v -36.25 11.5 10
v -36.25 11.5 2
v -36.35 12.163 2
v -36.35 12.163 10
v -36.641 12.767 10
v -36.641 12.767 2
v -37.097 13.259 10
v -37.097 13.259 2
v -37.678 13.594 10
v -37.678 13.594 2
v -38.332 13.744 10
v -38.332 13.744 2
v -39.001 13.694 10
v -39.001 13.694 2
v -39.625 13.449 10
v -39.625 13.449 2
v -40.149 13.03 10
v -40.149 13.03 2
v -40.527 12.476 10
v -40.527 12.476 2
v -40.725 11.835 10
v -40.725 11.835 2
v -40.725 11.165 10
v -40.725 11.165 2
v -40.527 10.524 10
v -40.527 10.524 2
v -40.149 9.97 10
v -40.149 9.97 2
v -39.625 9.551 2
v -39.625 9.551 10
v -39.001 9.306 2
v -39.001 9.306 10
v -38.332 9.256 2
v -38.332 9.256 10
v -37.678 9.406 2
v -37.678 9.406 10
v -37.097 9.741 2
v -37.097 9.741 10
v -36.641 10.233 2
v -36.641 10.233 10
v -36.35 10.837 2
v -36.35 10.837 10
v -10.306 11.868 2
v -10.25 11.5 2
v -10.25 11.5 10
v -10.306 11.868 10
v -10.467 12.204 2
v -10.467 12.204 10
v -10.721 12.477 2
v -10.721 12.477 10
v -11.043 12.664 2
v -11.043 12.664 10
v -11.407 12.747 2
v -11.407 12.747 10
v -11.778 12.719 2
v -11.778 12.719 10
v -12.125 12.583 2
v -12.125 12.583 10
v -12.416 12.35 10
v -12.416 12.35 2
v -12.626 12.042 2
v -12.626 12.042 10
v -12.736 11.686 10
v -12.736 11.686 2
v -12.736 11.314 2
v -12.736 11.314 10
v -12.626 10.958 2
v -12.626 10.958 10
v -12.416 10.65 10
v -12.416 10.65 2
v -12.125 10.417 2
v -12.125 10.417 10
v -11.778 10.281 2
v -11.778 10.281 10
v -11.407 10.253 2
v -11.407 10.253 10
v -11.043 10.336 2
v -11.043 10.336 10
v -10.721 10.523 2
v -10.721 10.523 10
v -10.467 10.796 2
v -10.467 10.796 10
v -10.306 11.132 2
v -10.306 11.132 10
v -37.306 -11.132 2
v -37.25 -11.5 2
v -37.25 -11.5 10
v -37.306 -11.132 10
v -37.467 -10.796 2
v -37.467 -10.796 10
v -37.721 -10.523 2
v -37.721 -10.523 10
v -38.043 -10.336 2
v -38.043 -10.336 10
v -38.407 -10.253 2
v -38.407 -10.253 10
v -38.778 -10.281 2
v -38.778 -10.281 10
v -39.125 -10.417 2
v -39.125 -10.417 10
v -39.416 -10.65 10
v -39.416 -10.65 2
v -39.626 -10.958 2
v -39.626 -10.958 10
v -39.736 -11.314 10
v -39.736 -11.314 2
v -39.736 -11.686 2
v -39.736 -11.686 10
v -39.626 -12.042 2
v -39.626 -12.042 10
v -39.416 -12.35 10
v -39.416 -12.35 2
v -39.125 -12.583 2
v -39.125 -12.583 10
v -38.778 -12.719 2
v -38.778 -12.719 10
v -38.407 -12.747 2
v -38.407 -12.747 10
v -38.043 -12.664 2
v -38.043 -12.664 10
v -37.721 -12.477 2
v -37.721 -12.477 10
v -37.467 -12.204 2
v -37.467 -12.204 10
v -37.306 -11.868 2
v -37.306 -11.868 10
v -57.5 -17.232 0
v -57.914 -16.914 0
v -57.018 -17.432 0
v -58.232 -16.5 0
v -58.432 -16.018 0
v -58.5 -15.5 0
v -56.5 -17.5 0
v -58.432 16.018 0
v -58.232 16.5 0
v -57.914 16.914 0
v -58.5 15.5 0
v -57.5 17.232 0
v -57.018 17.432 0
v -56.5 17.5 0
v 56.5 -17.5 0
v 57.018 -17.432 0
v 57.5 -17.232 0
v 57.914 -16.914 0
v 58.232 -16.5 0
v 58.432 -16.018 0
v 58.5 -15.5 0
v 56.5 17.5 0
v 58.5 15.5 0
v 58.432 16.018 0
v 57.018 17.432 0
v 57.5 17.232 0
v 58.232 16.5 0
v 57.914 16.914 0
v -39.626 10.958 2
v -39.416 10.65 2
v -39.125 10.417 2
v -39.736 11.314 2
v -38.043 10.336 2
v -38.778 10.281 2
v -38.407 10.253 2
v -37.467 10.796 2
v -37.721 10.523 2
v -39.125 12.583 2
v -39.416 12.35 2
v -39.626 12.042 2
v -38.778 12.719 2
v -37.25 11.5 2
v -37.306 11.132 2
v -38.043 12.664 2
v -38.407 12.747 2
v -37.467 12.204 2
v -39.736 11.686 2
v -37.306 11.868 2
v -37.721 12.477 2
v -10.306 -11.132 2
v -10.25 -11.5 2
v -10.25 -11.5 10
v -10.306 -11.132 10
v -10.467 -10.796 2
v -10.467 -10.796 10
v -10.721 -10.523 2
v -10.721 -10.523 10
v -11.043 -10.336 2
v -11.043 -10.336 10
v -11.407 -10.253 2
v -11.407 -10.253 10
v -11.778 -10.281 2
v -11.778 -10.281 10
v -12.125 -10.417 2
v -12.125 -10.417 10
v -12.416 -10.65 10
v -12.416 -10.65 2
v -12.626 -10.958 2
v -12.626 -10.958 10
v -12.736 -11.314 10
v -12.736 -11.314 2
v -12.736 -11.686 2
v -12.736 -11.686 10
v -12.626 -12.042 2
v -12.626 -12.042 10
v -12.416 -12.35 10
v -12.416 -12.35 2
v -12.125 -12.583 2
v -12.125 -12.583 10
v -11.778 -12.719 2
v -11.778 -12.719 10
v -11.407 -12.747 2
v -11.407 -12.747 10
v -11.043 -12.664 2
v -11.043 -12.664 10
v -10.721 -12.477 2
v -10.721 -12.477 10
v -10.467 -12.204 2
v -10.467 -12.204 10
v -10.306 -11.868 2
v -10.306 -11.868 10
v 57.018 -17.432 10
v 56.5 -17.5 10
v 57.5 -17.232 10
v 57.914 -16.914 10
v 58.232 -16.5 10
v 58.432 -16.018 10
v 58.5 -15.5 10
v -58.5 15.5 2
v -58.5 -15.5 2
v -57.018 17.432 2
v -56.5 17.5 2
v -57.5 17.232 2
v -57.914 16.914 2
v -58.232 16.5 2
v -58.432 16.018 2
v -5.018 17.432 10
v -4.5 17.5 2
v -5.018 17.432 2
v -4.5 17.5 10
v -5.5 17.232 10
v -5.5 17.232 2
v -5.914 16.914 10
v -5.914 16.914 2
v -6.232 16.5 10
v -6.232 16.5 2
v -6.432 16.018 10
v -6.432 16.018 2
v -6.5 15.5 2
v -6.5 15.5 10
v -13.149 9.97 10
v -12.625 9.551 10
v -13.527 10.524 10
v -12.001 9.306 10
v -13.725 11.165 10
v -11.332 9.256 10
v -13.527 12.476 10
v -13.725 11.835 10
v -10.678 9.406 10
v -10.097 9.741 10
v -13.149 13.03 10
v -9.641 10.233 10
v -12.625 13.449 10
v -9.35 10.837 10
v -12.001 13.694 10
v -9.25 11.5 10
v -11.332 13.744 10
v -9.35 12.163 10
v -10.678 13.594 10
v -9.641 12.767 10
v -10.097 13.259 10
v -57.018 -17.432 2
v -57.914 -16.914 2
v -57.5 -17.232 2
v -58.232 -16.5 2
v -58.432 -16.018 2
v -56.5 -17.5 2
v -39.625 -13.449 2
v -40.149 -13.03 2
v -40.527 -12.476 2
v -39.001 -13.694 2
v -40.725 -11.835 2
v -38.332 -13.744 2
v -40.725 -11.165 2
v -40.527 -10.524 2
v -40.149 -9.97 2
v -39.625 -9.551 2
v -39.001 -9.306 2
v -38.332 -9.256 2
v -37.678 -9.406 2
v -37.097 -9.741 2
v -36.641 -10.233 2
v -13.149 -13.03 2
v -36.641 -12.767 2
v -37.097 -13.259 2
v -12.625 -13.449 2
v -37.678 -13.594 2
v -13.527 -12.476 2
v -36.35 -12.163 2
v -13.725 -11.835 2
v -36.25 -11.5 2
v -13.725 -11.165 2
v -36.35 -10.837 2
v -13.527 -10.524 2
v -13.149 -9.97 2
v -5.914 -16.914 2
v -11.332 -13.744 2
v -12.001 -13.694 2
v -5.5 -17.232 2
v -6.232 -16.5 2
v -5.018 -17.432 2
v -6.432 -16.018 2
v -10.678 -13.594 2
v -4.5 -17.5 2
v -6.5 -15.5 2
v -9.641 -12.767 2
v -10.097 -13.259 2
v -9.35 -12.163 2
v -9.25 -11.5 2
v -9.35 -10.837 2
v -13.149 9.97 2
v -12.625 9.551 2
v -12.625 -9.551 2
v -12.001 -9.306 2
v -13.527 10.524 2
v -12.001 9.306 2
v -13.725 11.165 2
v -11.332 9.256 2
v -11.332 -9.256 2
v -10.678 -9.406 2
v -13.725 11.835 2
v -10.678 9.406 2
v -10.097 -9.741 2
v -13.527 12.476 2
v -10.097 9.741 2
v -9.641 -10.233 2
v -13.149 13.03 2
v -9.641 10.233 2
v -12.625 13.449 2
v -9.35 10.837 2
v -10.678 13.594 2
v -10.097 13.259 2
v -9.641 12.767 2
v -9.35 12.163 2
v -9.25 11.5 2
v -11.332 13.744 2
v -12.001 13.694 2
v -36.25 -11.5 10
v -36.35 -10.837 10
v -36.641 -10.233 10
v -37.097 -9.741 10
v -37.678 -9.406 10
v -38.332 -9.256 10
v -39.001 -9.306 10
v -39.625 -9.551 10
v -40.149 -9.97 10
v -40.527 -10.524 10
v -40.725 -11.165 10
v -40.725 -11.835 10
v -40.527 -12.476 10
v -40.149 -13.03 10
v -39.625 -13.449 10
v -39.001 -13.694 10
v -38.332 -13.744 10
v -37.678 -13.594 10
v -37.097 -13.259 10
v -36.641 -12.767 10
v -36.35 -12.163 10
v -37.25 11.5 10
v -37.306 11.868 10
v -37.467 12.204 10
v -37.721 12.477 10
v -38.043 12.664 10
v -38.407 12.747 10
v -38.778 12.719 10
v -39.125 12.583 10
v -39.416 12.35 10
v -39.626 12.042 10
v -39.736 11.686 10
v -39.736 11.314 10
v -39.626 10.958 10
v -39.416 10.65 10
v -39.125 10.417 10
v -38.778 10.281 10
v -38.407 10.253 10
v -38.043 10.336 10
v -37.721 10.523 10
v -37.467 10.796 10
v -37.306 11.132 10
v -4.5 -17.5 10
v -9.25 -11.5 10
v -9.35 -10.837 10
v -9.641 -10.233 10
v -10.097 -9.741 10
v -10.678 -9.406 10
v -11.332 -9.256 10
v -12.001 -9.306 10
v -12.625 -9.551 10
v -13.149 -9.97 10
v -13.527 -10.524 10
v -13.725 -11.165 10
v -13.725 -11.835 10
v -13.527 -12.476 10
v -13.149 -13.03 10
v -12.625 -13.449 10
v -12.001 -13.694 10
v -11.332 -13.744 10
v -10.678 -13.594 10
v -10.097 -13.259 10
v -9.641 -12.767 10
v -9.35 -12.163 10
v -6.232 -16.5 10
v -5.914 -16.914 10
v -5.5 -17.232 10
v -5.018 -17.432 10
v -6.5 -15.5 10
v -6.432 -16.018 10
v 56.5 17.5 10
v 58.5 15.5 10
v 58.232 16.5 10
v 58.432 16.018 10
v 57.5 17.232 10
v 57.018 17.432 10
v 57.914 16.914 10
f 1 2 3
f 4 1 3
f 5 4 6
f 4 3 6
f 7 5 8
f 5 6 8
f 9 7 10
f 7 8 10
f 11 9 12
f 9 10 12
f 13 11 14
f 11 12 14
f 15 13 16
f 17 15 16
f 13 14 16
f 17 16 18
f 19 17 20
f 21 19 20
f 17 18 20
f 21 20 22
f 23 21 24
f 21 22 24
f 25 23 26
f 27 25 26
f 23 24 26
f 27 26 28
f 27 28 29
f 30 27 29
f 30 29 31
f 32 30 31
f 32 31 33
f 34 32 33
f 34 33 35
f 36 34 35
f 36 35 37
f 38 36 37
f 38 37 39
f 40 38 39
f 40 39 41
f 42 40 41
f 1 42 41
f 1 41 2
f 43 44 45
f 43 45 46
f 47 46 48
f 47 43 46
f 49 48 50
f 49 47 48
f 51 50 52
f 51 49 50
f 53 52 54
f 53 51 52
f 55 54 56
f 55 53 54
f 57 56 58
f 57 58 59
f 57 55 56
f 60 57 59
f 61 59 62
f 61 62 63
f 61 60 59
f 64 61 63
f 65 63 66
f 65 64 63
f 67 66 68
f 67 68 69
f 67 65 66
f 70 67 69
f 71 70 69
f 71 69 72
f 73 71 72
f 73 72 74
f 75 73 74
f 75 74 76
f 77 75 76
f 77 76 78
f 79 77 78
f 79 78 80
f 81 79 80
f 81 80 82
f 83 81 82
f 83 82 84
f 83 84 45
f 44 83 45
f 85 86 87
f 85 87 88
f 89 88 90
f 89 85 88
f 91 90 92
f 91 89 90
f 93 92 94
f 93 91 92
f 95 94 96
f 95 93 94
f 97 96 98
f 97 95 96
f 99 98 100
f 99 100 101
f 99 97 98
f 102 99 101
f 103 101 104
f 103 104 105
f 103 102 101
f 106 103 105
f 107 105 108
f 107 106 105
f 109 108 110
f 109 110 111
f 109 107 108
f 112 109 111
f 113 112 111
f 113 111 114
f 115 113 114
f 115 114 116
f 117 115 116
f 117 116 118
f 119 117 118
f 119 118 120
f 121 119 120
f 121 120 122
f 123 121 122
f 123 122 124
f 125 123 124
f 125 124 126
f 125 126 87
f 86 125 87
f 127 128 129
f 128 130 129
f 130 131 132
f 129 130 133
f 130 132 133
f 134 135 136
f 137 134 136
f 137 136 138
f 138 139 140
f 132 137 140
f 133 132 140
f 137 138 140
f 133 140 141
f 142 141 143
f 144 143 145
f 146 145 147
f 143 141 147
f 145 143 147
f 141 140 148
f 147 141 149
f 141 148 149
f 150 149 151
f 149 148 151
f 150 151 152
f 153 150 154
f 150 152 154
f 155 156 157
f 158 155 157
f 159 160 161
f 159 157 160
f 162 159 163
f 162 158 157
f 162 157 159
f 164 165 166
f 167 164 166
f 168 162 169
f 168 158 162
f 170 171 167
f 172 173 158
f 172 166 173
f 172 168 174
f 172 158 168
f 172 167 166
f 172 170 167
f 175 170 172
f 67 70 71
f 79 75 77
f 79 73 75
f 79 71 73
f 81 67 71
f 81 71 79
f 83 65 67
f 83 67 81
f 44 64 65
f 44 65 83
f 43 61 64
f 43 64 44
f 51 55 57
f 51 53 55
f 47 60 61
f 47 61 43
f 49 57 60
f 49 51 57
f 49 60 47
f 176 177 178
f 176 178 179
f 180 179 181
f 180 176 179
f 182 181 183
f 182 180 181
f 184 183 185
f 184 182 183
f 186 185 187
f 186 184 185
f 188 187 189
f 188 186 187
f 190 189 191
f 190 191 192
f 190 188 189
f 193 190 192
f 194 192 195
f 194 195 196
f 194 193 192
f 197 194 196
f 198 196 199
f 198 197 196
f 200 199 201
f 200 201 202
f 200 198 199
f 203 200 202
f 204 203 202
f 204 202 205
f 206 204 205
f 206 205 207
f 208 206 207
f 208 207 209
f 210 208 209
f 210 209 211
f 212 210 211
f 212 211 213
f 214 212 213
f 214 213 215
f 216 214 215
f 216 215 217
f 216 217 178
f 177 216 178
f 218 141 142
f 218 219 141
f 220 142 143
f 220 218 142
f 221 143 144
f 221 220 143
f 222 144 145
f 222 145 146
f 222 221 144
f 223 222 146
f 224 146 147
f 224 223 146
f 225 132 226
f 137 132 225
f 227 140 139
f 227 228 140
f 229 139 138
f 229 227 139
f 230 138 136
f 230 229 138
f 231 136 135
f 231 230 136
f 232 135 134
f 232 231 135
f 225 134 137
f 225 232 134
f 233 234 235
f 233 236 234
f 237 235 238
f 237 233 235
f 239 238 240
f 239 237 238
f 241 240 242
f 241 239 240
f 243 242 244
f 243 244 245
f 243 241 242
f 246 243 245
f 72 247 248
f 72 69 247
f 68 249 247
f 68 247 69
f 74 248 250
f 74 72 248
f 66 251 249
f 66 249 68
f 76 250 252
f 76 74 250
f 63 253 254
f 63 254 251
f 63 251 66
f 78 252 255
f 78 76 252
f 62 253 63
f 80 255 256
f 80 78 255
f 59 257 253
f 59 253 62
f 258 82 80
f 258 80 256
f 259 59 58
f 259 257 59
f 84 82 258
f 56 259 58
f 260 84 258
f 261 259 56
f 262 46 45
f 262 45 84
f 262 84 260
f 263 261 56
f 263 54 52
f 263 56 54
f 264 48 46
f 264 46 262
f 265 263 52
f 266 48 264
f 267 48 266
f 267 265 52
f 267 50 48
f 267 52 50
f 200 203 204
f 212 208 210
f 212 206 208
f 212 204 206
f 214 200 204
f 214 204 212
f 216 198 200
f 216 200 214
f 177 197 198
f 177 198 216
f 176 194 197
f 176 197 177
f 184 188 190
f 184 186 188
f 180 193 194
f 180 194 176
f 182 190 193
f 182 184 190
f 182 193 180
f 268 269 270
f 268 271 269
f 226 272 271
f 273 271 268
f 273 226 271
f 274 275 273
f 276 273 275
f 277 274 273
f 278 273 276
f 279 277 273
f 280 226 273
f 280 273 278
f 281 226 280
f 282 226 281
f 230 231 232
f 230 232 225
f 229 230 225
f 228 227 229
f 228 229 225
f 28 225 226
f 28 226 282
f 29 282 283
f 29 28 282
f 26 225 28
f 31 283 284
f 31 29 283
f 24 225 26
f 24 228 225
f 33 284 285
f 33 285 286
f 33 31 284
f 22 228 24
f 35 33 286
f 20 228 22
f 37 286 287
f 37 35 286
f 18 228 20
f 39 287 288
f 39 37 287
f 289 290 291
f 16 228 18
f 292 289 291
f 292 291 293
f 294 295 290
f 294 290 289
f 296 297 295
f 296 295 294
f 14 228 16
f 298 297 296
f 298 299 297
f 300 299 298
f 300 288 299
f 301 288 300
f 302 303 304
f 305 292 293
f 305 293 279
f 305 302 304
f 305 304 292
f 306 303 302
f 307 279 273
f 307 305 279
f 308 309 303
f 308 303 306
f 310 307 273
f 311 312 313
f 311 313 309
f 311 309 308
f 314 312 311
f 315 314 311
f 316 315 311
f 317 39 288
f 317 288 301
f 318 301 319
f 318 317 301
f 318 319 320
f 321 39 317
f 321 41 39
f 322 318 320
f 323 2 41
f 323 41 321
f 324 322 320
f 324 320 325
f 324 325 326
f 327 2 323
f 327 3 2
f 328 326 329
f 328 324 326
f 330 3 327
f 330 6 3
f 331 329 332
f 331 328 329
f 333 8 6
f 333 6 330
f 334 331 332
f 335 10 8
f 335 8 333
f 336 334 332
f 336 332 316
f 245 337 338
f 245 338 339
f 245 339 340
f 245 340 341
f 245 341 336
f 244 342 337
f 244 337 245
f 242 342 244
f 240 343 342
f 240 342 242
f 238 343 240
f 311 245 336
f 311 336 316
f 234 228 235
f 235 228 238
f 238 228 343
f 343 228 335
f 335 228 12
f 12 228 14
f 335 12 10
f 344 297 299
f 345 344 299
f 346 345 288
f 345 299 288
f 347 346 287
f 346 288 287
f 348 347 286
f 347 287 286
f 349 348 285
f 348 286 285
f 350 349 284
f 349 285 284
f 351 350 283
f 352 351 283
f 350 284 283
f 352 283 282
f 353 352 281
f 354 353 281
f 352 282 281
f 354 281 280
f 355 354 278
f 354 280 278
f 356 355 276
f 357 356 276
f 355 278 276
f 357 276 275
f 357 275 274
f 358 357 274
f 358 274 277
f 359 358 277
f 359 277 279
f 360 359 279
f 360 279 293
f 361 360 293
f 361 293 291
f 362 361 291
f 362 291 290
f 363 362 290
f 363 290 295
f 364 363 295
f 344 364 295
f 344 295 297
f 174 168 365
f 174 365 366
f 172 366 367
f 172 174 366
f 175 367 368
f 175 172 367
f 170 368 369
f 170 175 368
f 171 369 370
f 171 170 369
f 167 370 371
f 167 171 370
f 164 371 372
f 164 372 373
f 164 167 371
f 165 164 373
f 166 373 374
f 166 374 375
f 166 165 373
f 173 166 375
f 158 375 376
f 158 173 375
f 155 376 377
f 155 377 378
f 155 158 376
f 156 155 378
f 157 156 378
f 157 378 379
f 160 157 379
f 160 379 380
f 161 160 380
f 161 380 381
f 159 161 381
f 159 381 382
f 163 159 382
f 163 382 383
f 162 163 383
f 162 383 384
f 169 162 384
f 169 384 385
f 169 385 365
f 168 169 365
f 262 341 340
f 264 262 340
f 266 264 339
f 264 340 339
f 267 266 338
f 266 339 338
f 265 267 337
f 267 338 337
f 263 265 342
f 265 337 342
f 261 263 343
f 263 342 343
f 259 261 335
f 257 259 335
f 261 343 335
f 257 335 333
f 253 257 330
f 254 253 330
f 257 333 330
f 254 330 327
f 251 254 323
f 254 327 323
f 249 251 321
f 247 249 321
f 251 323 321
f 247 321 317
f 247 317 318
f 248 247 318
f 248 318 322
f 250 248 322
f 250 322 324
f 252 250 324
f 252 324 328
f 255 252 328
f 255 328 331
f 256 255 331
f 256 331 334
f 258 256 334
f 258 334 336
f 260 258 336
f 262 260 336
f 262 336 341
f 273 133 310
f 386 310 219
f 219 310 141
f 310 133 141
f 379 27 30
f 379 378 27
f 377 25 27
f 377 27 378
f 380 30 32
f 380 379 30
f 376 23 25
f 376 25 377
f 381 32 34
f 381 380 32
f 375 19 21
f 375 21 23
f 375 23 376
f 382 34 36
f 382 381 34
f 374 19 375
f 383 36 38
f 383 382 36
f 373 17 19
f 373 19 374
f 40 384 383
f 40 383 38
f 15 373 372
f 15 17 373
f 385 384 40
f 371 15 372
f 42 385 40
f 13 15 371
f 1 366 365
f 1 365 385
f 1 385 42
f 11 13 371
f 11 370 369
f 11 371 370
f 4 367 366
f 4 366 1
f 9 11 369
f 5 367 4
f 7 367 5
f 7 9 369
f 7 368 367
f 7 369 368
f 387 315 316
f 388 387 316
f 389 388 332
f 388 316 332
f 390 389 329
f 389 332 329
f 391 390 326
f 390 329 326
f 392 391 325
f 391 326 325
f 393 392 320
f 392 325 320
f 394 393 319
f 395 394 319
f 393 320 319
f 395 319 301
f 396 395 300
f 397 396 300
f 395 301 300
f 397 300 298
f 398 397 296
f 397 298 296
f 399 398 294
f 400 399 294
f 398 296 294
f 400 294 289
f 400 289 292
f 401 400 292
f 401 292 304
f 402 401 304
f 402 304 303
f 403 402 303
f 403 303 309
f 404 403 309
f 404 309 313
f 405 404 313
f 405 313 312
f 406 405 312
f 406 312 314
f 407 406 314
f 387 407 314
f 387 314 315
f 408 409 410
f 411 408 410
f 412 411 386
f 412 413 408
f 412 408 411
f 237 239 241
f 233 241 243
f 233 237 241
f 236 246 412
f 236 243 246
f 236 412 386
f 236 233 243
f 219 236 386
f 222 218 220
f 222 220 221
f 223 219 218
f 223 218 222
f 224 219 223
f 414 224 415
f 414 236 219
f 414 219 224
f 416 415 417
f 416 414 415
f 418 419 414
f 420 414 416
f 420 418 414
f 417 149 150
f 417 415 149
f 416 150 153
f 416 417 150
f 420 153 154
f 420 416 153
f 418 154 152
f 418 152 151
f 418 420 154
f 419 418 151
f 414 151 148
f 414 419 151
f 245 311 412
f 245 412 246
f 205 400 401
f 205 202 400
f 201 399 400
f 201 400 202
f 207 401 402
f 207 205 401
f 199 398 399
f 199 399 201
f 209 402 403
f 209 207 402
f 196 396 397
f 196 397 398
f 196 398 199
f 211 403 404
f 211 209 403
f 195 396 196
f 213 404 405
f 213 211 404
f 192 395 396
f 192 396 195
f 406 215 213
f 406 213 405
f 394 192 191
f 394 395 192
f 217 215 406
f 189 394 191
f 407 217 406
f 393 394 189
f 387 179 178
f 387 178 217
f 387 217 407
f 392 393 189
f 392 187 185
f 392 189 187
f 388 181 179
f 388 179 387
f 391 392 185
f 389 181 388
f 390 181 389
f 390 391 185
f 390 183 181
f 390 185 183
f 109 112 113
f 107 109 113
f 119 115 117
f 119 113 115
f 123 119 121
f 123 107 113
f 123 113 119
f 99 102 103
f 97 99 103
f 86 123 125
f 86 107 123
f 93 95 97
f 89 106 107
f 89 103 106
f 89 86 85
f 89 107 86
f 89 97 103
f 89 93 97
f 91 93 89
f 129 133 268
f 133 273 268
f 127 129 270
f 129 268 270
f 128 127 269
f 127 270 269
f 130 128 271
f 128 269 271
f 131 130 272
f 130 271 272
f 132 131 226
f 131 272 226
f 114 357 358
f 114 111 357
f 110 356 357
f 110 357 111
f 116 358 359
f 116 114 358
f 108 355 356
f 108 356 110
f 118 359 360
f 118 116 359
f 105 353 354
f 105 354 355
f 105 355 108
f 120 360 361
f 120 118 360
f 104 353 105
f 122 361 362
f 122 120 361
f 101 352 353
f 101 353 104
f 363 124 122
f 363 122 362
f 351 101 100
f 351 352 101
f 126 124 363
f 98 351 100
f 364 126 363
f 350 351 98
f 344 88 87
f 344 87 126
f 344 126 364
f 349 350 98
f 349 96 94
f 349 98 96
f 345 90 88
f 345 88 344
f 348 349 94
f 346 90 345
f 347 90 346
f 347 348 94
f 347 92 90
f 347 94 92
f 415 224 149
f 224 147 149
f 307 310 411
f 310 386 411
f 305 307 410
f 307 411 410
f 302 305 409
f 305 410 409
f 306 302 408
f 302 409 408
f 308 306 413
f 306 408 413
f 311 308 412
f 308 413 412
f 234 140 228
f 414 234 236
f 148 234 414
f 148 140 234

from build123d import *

# Parameters (mm, degrees)
SKETCH1_R             = 2.25
SKETCH1_R_2           = 1.25
BOSS_EXTRUDE1_DEPTH   = 10
BOSS_EXTRUDE1_2_DEPTH = 10
BOSS_EXTRUDE1_3_DEPTH = 10
BOSS_EXTRUDE1_4_DEPTH = 10
SKETCH1_3_W           = 117
SKETCH1_3_H           = 35
BOSS_EXTRUDE2_DEPTH   = 2
SKETCH1_4_W           = 65
SKETCH1_4_H           = 35
BOSS_EXTRUDE3_DEPTH   = 10
FILLET1_R             = 2


with BuildPart() as part:
    # Sketch1 → Boss-Extrude1 (new body)
    with BuildSketch(Plane.XY):
        with Locations((-38.5, -11.5)):
            Circle(SKETCH1_R)
        with Locations((-38.5, -11.5)):
            Circle(SKETCH1_R_2, mode=Mode.SUBTRACT)
    extrude(amount=BOSS_EXTRUDE1_DEPTH)



with BuildPart() as body_2:
    # Sketch1 → Boss-Extrude1 2 (new body)
    with BuildSketch(Plane.XY):
        with Locations((-11.5, -11.5)):
            Circle(SKETCH1_R)
        with Locations((-11.5, -11.5)):
            Circle(SKETCH1_R_2, mode=Mode.SUBTRACT)
    extrude(amount=BOSS_EXTRUDE1_2_DEPTH)


with BuildPart() as body_3:
    # Sketch1 → Boss-Extrude1 3 (new body)
    with BuildSketch(Plane.XY):
        with Locations((-11.5, 11.5)):
            Circle(SKETCH1_R)
        with Locations((-11.5, 11.5)):
            Circle(SKETCH1_R_2, mode=Mode.SUBTRACT)
    extrude(amount=BOSS_EXTRUDE1_3_DEPTH)


with BuildPart() as body_4:
    # Sketch1 → Boss-Extrude1 4 (new body)
    with BuildSketch(Plane.XY):
        with Locations((-38.5, 11.5)):
            Circle(SKETCH1_R)
        with Locations((-38.5, 11.5)):
            Circle(SKETCH1_R_2, mode=Mode.SUBTRACT)
    extrude(amount=BOSS_EXTRUDE1_4_DEPTH)


with BuildPart() as part_1:
    add(part.part)

    add(body_2.part)  # Boss-Extrude2 merges body 2

    add(body_3.part)  # Boss-Extrude2 merges body 3

    add(body_4.part)  # Boss-Extrude2 merges body 4
    # Sketch1<3> → Boss-Extrude2 (add)
    with BuildSketch(Plane.XY):
        Rectangle(SKETCH1_3_W, SKETCH1_3_H)
    extrude(amount=BOSS_EXTRUDE2_DEPTH)

    # Sketch1<4> → Boss-Extrude3 (add)
    with BuildSketch(Plane.XY):
        with Locations((26, 0)):
            Rectangle(SKETCH1_4_W, SKETCH1_4_H)
    extrude(amount=BOSS_EXTRUDE3_DEPTH)

    # Fillet1
    fillet1_edges = [part_1.edges().sort_by_distance(p)[0] for p in [
        (-58.5, 17.5, 1),
        (58.5, 17.5, 5),
        (58.5, -17.5, 5),
        (-58.5, -17.5, 1),
        (-6.5, -17.5, 6),
        (-6.5, 17.5, 6),
    ]]
    fillet(fillet1_edges, radius=FILLET1_R)


solid = part_1.part
